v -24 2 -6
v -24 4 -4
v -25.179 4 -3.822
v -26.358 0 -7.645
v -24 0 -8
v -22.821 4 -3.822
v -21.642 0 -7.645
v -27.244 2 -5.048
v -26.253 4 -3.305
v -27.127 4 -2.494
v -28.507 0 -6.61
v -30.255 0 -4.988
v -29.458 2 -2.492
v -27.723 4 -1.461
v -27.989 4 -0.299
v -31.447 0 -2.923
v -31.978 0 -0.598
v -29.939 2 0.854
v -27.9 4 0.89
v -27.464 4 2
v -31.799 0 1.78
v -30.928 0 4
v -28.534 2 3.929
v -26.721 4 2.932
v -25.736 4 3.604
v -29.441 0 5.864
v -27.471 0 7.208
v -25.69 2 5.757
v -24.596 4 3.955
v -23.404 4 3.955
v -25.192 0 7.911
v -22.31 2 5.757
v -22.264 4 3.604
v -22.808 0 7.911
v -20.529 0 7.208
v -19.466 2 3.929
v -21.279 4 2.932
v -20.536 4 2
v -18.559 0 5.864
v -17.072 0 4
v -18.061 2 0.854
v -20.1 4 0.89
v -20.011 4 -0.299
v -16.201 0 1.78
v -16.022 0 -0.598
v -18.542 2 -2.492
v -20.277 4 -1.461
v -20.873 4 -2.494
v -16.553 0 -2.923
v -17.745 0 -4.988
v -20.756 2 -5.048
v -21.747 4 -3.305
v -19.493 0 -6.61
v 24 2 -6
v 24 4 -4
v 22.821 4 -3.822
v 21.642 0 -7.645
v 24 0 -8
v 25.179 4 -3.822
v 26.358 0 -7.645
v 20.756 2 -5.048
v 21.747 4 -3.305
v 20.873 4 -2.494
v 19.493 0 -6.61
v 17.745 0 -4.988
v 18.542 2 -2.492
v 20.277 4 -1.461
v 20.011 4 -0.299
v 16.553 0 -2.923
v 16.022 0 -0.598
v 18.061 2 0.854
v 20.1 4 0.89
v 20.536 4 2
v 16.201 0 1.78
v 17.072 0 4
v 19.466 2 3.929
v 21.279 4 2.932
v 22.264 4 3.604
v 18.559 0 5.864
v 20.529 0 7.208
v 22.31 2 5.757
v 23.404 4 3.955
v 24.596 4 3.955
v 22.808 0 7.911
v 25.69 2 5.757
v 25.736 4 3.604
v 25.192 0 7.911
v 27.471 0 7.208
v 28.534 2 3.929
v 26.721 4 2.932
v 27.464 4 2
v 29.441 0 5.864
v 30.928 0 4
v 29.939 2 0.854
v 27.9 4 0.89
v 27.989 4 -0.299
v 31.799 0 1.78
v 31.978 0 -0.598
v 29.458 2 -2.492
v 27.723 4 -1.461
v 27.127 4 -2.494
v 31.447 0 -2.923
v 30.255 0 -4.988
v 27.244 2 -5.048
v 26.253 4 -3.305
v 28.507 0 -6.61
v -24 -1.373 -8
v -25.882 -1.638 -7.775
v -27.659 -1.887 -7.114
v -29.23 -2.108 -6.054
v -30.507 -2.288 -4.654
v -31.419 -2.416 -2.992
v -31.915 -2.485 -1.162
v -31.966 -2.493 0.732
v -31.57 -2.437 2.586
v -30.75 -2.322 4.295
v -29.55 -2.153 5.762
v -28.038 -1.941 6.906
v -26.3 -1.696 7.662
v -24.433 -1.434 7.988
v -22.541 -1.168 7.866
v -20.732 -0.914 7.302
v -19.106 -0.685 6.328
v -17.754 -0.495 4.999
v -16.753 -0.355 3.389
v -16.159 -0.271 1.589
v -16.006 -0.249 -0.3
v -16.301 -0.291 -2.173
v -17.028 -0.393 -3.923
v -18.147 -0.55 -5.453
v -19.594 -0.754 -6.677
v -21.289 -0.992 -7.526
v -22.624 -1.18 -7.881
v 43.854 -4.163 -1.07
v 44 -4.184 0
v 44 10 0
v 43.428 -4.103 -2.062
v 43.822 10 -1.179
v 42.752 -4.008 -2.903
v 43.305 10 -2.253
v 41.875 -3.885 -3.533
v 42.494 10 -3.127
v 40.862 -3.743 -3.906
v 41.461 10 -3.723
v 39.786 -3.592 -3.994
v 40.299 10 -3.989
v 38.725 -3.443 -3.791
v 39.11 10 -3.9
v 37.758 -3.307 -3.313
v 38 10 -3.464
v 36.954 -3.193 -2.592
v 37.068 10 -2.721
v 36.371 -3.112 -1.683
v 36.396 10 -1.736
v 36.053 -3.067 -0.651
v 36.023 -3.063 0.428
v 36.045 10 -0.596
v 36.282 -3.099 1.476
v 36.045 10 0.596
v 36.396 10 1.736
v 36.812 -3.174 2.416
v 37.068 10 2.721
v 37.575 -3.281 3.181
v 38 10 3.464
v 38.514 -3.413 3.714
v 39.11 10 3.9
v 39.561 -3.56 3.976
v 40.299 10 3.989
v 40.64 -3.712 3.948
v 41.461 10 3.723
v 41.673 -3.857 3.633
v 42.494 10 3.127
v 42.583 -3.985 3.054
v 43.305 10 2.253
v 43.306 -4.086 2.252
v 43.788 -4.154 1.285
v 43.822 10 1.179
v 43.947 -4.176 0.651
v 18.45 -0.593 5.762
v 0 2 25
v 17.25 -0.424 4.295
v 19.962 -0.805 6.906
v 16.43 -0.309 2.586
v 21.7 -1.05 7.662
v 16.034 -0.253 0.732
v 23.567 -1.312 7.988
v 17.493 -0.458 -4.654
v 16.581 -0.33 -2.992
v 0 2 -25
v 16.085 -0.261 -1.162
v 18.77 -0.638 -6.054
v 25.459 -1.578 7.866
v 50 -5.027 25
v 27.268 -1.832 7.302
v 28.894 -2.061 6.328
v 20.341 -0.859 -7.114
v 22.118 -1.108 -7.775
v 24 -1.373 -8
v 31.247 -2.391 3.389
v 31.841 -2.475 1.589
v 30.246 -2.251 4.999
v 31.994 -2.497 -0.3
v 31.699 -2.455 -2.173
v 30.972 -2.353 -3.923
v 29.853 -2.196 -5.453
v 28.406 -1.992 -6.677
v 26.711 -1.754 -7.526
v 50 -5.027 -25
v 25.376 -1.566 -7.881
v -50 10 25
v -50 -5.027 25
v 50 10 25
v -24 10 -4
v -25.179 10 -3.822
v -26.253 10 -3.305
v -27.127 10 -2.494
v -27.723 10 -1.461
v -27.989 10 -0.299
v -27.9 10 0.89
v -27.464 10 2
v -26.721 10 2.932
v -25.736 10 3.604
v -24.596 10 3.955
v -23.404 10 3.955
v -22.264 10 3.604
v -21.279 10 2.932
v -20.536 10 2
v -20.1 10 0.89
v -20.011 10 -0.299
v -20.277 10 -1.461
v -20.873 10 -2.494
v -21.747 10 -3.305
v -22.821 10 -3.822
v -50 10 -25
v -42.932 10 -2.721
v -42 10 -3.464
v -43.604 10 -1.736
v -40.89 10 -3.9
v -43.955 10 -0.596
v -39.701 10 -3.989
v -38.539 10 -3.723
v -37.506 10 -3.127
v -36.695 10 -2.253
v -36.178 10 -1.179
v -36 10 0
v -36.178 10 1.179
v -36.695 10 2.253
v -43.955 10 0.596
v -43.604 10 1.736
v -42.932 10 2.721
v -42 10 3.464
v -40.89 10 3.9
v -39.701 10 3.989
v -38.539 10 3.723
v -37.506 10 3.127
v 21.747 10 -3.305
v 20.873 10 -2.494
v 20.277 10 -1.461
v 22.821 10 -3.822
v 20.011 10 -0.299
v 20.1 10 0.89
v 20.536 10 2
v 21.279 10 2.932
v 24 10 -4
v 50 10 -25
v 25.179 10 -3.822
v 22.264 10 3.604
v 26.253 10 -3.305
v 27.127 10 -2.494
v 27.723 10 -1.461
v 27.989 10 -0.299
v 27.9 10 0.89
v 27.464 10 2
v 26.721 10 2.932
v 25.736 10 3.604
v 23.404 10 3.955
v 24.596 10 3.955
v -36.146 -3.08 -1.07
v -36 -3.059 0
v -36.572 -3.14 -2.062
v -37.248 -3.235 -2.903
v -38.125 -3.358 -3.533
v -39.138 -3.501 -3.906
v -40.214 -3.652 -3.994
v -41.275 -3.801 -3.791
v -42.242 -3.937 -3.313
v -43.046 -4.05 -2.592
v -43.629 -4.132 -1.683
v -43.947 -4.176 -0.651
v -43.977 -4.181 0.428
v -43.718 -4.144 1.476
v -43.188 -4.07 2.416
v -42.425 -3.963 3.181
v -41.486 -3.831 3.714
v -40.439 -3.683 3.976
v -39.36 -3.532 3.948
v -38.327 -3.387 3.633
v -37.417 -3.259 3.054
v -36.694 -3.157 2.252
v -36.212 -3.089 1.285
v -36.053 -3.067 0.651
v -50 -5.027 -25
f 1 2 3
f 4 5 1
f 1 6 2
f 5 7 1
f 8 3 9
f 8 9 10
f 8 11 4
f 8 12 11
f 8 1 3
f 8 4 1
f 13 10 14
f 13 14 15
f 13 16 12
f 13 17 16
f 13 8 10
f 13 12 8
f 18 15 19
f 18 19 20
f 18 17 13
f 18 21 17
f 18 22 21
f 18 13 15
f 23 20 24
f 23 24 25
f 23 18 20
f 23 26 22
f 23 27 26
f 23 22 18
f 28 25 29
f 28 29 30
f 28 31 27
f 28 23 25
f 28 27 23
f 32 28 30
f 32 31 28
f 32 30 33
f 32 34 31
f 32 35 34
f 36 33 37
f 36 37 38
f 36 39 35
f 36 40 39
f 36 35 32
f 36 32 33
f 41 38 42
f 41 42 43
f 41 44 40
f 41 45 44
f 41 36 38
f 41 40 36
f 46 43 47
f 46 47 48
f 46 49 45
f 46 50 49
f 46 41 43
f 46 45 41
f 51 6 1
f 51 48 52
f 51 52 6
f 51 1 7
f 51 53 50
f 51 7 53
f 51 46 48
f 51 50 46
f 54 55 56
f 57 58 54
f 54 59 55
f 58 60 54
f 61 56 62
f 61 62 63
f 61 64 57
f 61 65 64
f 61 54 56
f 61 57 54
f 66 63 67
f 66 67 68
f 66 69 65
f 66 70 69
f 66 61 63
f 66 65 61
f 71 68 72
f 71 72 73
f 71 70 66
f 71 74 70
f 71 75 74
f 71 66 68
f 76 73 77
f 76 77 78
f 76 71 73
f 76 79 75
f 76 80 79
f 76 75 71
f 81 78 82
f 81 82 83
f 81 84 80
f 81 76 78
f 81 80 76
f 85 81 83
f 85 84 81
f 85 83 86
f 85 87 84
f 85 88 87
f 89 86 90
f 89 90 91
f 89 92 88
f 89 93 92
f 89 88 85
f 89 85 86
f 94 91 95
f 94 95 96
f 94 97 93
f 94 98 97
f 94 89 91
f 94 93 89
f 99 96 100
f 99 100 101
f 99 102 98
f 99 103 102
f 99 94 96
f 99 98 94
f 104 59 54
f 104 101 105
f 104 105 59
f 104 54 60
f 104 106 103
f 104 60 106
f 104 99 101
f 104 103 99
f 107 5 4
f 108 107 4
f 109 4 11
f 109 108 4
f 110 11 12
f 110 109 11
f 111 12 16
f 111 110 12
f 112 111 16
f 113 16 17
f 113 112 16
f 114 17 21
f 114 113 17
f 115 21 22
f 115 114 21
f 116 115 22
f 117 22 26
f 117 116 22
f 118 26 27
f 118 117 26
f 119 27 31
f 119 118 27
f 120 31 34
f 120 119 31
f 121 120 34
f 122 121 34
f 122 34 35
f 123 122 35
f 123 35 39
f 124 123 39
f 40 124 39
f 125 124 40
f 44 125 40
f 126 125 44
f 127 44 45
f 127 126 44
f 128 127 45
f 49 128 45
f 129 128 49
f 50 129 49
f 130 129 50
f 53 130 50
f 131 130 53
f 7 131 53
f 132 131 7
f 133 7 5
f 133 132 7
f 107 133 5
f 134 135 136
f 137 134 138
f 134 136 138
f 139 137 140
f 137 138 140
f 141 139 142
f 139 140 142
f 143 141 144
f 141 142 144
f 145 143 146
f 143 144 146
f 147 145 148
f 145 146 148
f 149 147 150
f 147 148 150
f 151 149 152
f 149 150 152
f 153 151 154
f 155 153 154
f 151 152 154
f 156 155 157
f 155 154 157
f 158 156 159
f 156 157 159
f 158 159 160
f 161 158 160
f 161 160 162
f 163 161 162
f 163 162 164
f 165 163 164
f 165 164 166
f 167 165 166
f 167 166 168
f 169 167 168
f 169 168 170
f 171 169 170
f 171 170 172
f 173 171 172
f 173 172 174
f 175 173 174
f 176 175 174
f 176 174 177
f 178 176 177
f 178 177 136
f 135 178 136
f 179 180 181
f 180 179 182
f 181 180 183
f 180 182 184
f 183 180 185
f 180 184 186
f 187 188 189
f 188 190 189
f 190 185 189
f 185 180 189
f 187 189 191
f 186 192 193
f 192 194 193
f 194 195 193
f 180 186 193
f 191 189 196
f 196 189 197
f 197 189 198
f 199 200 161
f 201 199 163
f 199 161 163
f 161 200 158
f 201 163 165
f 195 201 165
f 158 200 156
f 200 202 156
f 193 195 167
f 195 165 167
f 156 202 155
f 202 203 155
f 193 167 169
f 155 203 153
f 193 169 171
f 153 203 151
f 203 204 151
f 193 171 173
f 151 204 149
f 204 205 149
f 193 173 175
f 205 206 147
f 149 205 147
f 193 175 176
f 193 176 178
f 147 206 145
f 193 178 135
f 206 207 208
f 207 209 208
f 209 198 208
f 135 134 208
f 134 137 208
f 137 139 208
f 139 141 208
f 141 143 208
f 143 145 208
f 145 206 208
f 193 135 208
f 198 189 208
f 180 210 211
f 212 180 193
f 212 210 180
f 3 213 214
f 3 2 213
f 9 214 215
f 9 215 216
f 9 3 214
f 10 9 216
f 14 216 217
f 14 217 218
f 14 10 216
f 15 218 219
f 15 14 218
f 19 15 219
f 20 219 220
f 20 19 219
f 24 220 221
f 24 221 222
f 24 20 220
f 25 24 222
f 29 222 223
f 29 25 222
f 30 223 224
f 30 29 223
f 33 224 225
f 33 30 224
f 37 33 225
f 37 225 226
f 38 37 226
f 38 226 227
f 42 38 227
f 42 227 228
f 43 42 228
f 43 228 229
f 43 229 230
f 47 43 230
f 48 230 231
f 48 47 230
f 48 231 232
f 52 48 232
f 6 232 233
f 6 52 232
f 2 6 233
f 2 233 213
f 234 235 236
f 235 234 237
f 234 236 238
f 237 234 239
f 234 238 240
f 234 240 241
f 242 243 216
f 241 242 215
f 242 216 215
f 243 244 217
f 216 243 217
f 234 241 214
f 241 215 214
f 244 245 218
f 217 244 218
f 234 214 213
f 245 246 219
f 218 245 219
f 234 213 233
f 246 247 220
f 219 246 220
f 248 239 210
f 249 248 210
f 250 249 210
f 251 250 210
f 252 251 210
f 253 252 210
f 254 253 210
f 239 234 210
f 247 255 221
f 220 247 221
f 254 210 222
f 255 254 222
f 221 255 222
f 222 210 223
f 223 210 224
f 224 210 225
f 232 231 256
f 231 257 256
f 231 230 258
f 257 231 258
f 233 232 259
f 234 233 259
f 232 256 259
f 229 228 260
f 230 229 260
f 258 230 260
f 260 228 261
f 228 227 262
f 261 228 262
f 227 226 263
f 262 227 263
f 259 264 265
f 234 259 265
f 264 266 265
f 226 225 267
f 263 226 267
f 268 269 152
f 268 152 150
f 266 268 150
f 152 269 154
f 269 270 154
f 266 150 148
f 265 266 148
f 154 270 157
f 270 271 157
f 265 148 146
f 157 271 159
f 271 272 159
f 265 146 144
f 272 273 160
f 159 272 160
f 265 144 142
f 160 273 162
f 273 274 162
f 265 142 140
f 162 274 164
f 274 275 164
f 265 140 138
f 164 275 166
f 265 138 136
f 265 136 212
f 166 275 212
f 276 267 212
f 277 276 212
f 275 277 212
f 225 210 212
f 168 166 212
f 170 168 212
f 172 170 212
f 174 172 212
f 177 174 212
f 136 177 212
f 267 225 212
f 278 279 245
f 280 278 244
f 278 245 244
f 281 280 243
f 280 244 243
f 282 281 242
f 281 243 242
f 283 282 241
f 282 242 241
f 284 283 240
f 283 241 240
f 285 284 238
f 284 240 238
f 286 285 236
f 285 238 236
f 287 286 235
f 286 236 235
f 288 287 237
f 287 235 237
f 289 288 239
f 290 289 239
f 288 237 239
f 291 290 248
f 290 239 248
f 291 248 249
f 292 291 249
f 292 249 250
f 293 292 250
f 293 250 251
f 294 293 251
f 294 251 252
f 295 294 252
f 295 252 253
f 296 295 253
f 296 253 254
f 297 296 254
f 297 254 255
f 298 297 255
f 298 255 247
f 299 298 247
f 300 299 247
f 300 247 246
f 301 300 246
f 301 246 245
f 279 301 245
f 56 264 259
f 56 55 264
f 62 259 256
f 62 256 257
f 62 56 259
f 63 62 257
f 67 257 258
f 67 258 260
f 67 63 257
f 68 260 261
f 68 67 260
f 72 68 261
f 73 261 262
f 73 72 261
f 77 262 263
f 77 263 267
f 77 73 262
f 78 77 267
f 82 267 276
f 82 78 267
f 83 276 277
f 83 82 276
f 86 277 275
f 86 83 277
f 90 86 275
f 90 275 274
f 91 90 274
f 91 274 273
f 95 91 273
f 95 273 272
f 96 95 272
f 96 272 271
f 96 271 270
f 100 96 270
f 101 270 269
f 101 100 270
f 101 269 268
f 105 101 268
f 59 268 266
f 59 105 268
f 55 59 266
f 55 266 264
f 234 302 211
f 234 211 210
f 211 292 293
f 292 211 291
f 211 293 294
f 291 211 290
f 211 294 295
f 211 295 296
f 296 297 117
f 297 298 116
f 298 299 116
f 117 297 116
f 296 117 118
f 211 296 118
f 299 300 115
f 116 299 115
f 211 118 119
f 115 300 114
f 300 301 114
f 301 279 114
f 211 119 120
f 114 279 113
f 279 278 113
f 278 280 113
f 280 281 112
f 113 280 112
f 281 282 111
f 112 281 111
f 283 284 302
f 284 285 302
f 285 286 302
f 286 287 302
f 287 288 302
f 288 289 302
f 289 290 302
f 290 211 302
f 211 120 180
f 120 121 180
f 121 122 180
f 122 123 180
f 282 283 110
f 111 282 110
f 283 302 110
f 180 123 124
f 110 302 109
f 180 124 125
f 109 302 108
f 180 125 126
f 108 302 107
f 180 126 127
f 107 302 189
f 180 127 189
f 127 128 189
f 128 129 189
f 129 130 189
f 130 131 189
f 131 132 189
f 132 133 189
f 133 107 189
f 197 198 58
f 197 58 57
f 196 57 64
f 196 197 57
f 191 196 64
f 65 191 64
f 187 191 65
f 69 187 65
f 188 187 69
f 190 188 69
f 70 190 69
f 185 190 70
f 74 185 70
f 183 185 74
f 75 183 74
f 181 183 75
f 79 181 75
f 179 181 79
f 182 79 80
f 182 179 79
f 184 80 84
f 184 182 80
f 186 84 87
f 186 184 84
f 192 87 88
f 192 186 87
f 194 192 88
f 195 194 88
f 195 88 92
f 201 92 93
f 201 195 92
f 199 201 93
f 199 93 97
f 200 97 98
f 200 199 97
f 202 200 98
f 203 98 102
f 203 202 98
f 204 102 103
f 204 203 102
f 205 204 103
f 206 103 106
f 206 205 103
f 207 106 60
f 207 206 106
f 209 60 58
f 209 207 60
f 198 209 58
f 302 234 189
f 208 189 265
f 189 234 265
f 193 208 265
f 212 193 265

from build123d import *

# Parameters (mm, degrees)
ESQUISSE1_W                                 = 100
ESQUISSE1_H                                 = 20
BOSS_EXTRU_1_DEPTH                          = 25
FRAISAGE_POUR_VIS_T_TE_FRAIS_E_M81_AT_COUNT = 2
FRAISAGE_POUR_VIS_T_TE_FRAIS_E_M81_AT_PITCH = 48
DIAM_TRE_DU_PER_AGE_8_0_8_1_D               = 8
ENL_V_MAT_EXTRU_1_DEPTH                     = 51


with BuildPart() as part:
    # Esquisse1 → Boss.-Extru.1 (new body, symmetric)
    with BuildSketch(Plane.XY):
        Rectangle(ESQUISSE1_W, ESQUISSE1_H)
    extrude(amount=BOSS_EXTRU_1_DEPTH, both=True)

    # Esquisse13 → Fraisage pour vis à tête fraisée M81 (revolve, cut)
    with BuildSketch(Plane(origin=(-24, -10, 0), x_dir=(0, 0, -1), z_dir=(1, 0, 0))):
        Polygon((0, 0), (0, 20), (4, 20), (4, 14), (8, 10), (8, 0), align=None)
    fraisage_pour_vis_t_te_frais_e_m81 = revolve(axis=Axis((-24, -16.35, 0), (0, 1, 0)), mode=Mode.SUBTRACT)

    # Fraisage pour vis à tête fraisée M81 at: Fraisage pour vis à tête fraisée M81 ×2
    with Locations(*[(i * FRAISAGE_POUR_VIS_T_TE_FRAIS_E_M81_AT_PITCH, 0, 0) for i in range(1, FRAISAGE_POUR_VIS_T_TE_FRAIS_E_M81_AT_COUNT)]):
        add(fraisage_pour_vis_t_te_frais_e_m81, mode=Mode.SUBTRACT)

    # Diamètre du perçage Ø8.0 (8)1 (through all)
    with Locations(Plane(origin=(0, -10, 0), x_dir=(-1, 0, 0), z_dir=(0, -1, 0))):
        with Locations((-40, 0), (40, 0)):
            Hole(DIAM_TRE_DU_PER_AGE_8_0_8_1_D / 2)

    # Esquisse16 → Enlèv. mat.-Extru.1 (cut, through all)
    with BuildSketch(Plane(origin=(0, 0, -25), x_dir=(-1, 0, 0), z_dir=(0, 0, -1))):
        Polygon((0, 2), (-50, -5.027041735), (-50, -10), (50, -10), (50, -5.027041735), align=None)
    extrude(amount=-ENL_V_MAT_EXTRU_1_DEPTH, mode=Mode.SUBTRACT)


solid = part.part
